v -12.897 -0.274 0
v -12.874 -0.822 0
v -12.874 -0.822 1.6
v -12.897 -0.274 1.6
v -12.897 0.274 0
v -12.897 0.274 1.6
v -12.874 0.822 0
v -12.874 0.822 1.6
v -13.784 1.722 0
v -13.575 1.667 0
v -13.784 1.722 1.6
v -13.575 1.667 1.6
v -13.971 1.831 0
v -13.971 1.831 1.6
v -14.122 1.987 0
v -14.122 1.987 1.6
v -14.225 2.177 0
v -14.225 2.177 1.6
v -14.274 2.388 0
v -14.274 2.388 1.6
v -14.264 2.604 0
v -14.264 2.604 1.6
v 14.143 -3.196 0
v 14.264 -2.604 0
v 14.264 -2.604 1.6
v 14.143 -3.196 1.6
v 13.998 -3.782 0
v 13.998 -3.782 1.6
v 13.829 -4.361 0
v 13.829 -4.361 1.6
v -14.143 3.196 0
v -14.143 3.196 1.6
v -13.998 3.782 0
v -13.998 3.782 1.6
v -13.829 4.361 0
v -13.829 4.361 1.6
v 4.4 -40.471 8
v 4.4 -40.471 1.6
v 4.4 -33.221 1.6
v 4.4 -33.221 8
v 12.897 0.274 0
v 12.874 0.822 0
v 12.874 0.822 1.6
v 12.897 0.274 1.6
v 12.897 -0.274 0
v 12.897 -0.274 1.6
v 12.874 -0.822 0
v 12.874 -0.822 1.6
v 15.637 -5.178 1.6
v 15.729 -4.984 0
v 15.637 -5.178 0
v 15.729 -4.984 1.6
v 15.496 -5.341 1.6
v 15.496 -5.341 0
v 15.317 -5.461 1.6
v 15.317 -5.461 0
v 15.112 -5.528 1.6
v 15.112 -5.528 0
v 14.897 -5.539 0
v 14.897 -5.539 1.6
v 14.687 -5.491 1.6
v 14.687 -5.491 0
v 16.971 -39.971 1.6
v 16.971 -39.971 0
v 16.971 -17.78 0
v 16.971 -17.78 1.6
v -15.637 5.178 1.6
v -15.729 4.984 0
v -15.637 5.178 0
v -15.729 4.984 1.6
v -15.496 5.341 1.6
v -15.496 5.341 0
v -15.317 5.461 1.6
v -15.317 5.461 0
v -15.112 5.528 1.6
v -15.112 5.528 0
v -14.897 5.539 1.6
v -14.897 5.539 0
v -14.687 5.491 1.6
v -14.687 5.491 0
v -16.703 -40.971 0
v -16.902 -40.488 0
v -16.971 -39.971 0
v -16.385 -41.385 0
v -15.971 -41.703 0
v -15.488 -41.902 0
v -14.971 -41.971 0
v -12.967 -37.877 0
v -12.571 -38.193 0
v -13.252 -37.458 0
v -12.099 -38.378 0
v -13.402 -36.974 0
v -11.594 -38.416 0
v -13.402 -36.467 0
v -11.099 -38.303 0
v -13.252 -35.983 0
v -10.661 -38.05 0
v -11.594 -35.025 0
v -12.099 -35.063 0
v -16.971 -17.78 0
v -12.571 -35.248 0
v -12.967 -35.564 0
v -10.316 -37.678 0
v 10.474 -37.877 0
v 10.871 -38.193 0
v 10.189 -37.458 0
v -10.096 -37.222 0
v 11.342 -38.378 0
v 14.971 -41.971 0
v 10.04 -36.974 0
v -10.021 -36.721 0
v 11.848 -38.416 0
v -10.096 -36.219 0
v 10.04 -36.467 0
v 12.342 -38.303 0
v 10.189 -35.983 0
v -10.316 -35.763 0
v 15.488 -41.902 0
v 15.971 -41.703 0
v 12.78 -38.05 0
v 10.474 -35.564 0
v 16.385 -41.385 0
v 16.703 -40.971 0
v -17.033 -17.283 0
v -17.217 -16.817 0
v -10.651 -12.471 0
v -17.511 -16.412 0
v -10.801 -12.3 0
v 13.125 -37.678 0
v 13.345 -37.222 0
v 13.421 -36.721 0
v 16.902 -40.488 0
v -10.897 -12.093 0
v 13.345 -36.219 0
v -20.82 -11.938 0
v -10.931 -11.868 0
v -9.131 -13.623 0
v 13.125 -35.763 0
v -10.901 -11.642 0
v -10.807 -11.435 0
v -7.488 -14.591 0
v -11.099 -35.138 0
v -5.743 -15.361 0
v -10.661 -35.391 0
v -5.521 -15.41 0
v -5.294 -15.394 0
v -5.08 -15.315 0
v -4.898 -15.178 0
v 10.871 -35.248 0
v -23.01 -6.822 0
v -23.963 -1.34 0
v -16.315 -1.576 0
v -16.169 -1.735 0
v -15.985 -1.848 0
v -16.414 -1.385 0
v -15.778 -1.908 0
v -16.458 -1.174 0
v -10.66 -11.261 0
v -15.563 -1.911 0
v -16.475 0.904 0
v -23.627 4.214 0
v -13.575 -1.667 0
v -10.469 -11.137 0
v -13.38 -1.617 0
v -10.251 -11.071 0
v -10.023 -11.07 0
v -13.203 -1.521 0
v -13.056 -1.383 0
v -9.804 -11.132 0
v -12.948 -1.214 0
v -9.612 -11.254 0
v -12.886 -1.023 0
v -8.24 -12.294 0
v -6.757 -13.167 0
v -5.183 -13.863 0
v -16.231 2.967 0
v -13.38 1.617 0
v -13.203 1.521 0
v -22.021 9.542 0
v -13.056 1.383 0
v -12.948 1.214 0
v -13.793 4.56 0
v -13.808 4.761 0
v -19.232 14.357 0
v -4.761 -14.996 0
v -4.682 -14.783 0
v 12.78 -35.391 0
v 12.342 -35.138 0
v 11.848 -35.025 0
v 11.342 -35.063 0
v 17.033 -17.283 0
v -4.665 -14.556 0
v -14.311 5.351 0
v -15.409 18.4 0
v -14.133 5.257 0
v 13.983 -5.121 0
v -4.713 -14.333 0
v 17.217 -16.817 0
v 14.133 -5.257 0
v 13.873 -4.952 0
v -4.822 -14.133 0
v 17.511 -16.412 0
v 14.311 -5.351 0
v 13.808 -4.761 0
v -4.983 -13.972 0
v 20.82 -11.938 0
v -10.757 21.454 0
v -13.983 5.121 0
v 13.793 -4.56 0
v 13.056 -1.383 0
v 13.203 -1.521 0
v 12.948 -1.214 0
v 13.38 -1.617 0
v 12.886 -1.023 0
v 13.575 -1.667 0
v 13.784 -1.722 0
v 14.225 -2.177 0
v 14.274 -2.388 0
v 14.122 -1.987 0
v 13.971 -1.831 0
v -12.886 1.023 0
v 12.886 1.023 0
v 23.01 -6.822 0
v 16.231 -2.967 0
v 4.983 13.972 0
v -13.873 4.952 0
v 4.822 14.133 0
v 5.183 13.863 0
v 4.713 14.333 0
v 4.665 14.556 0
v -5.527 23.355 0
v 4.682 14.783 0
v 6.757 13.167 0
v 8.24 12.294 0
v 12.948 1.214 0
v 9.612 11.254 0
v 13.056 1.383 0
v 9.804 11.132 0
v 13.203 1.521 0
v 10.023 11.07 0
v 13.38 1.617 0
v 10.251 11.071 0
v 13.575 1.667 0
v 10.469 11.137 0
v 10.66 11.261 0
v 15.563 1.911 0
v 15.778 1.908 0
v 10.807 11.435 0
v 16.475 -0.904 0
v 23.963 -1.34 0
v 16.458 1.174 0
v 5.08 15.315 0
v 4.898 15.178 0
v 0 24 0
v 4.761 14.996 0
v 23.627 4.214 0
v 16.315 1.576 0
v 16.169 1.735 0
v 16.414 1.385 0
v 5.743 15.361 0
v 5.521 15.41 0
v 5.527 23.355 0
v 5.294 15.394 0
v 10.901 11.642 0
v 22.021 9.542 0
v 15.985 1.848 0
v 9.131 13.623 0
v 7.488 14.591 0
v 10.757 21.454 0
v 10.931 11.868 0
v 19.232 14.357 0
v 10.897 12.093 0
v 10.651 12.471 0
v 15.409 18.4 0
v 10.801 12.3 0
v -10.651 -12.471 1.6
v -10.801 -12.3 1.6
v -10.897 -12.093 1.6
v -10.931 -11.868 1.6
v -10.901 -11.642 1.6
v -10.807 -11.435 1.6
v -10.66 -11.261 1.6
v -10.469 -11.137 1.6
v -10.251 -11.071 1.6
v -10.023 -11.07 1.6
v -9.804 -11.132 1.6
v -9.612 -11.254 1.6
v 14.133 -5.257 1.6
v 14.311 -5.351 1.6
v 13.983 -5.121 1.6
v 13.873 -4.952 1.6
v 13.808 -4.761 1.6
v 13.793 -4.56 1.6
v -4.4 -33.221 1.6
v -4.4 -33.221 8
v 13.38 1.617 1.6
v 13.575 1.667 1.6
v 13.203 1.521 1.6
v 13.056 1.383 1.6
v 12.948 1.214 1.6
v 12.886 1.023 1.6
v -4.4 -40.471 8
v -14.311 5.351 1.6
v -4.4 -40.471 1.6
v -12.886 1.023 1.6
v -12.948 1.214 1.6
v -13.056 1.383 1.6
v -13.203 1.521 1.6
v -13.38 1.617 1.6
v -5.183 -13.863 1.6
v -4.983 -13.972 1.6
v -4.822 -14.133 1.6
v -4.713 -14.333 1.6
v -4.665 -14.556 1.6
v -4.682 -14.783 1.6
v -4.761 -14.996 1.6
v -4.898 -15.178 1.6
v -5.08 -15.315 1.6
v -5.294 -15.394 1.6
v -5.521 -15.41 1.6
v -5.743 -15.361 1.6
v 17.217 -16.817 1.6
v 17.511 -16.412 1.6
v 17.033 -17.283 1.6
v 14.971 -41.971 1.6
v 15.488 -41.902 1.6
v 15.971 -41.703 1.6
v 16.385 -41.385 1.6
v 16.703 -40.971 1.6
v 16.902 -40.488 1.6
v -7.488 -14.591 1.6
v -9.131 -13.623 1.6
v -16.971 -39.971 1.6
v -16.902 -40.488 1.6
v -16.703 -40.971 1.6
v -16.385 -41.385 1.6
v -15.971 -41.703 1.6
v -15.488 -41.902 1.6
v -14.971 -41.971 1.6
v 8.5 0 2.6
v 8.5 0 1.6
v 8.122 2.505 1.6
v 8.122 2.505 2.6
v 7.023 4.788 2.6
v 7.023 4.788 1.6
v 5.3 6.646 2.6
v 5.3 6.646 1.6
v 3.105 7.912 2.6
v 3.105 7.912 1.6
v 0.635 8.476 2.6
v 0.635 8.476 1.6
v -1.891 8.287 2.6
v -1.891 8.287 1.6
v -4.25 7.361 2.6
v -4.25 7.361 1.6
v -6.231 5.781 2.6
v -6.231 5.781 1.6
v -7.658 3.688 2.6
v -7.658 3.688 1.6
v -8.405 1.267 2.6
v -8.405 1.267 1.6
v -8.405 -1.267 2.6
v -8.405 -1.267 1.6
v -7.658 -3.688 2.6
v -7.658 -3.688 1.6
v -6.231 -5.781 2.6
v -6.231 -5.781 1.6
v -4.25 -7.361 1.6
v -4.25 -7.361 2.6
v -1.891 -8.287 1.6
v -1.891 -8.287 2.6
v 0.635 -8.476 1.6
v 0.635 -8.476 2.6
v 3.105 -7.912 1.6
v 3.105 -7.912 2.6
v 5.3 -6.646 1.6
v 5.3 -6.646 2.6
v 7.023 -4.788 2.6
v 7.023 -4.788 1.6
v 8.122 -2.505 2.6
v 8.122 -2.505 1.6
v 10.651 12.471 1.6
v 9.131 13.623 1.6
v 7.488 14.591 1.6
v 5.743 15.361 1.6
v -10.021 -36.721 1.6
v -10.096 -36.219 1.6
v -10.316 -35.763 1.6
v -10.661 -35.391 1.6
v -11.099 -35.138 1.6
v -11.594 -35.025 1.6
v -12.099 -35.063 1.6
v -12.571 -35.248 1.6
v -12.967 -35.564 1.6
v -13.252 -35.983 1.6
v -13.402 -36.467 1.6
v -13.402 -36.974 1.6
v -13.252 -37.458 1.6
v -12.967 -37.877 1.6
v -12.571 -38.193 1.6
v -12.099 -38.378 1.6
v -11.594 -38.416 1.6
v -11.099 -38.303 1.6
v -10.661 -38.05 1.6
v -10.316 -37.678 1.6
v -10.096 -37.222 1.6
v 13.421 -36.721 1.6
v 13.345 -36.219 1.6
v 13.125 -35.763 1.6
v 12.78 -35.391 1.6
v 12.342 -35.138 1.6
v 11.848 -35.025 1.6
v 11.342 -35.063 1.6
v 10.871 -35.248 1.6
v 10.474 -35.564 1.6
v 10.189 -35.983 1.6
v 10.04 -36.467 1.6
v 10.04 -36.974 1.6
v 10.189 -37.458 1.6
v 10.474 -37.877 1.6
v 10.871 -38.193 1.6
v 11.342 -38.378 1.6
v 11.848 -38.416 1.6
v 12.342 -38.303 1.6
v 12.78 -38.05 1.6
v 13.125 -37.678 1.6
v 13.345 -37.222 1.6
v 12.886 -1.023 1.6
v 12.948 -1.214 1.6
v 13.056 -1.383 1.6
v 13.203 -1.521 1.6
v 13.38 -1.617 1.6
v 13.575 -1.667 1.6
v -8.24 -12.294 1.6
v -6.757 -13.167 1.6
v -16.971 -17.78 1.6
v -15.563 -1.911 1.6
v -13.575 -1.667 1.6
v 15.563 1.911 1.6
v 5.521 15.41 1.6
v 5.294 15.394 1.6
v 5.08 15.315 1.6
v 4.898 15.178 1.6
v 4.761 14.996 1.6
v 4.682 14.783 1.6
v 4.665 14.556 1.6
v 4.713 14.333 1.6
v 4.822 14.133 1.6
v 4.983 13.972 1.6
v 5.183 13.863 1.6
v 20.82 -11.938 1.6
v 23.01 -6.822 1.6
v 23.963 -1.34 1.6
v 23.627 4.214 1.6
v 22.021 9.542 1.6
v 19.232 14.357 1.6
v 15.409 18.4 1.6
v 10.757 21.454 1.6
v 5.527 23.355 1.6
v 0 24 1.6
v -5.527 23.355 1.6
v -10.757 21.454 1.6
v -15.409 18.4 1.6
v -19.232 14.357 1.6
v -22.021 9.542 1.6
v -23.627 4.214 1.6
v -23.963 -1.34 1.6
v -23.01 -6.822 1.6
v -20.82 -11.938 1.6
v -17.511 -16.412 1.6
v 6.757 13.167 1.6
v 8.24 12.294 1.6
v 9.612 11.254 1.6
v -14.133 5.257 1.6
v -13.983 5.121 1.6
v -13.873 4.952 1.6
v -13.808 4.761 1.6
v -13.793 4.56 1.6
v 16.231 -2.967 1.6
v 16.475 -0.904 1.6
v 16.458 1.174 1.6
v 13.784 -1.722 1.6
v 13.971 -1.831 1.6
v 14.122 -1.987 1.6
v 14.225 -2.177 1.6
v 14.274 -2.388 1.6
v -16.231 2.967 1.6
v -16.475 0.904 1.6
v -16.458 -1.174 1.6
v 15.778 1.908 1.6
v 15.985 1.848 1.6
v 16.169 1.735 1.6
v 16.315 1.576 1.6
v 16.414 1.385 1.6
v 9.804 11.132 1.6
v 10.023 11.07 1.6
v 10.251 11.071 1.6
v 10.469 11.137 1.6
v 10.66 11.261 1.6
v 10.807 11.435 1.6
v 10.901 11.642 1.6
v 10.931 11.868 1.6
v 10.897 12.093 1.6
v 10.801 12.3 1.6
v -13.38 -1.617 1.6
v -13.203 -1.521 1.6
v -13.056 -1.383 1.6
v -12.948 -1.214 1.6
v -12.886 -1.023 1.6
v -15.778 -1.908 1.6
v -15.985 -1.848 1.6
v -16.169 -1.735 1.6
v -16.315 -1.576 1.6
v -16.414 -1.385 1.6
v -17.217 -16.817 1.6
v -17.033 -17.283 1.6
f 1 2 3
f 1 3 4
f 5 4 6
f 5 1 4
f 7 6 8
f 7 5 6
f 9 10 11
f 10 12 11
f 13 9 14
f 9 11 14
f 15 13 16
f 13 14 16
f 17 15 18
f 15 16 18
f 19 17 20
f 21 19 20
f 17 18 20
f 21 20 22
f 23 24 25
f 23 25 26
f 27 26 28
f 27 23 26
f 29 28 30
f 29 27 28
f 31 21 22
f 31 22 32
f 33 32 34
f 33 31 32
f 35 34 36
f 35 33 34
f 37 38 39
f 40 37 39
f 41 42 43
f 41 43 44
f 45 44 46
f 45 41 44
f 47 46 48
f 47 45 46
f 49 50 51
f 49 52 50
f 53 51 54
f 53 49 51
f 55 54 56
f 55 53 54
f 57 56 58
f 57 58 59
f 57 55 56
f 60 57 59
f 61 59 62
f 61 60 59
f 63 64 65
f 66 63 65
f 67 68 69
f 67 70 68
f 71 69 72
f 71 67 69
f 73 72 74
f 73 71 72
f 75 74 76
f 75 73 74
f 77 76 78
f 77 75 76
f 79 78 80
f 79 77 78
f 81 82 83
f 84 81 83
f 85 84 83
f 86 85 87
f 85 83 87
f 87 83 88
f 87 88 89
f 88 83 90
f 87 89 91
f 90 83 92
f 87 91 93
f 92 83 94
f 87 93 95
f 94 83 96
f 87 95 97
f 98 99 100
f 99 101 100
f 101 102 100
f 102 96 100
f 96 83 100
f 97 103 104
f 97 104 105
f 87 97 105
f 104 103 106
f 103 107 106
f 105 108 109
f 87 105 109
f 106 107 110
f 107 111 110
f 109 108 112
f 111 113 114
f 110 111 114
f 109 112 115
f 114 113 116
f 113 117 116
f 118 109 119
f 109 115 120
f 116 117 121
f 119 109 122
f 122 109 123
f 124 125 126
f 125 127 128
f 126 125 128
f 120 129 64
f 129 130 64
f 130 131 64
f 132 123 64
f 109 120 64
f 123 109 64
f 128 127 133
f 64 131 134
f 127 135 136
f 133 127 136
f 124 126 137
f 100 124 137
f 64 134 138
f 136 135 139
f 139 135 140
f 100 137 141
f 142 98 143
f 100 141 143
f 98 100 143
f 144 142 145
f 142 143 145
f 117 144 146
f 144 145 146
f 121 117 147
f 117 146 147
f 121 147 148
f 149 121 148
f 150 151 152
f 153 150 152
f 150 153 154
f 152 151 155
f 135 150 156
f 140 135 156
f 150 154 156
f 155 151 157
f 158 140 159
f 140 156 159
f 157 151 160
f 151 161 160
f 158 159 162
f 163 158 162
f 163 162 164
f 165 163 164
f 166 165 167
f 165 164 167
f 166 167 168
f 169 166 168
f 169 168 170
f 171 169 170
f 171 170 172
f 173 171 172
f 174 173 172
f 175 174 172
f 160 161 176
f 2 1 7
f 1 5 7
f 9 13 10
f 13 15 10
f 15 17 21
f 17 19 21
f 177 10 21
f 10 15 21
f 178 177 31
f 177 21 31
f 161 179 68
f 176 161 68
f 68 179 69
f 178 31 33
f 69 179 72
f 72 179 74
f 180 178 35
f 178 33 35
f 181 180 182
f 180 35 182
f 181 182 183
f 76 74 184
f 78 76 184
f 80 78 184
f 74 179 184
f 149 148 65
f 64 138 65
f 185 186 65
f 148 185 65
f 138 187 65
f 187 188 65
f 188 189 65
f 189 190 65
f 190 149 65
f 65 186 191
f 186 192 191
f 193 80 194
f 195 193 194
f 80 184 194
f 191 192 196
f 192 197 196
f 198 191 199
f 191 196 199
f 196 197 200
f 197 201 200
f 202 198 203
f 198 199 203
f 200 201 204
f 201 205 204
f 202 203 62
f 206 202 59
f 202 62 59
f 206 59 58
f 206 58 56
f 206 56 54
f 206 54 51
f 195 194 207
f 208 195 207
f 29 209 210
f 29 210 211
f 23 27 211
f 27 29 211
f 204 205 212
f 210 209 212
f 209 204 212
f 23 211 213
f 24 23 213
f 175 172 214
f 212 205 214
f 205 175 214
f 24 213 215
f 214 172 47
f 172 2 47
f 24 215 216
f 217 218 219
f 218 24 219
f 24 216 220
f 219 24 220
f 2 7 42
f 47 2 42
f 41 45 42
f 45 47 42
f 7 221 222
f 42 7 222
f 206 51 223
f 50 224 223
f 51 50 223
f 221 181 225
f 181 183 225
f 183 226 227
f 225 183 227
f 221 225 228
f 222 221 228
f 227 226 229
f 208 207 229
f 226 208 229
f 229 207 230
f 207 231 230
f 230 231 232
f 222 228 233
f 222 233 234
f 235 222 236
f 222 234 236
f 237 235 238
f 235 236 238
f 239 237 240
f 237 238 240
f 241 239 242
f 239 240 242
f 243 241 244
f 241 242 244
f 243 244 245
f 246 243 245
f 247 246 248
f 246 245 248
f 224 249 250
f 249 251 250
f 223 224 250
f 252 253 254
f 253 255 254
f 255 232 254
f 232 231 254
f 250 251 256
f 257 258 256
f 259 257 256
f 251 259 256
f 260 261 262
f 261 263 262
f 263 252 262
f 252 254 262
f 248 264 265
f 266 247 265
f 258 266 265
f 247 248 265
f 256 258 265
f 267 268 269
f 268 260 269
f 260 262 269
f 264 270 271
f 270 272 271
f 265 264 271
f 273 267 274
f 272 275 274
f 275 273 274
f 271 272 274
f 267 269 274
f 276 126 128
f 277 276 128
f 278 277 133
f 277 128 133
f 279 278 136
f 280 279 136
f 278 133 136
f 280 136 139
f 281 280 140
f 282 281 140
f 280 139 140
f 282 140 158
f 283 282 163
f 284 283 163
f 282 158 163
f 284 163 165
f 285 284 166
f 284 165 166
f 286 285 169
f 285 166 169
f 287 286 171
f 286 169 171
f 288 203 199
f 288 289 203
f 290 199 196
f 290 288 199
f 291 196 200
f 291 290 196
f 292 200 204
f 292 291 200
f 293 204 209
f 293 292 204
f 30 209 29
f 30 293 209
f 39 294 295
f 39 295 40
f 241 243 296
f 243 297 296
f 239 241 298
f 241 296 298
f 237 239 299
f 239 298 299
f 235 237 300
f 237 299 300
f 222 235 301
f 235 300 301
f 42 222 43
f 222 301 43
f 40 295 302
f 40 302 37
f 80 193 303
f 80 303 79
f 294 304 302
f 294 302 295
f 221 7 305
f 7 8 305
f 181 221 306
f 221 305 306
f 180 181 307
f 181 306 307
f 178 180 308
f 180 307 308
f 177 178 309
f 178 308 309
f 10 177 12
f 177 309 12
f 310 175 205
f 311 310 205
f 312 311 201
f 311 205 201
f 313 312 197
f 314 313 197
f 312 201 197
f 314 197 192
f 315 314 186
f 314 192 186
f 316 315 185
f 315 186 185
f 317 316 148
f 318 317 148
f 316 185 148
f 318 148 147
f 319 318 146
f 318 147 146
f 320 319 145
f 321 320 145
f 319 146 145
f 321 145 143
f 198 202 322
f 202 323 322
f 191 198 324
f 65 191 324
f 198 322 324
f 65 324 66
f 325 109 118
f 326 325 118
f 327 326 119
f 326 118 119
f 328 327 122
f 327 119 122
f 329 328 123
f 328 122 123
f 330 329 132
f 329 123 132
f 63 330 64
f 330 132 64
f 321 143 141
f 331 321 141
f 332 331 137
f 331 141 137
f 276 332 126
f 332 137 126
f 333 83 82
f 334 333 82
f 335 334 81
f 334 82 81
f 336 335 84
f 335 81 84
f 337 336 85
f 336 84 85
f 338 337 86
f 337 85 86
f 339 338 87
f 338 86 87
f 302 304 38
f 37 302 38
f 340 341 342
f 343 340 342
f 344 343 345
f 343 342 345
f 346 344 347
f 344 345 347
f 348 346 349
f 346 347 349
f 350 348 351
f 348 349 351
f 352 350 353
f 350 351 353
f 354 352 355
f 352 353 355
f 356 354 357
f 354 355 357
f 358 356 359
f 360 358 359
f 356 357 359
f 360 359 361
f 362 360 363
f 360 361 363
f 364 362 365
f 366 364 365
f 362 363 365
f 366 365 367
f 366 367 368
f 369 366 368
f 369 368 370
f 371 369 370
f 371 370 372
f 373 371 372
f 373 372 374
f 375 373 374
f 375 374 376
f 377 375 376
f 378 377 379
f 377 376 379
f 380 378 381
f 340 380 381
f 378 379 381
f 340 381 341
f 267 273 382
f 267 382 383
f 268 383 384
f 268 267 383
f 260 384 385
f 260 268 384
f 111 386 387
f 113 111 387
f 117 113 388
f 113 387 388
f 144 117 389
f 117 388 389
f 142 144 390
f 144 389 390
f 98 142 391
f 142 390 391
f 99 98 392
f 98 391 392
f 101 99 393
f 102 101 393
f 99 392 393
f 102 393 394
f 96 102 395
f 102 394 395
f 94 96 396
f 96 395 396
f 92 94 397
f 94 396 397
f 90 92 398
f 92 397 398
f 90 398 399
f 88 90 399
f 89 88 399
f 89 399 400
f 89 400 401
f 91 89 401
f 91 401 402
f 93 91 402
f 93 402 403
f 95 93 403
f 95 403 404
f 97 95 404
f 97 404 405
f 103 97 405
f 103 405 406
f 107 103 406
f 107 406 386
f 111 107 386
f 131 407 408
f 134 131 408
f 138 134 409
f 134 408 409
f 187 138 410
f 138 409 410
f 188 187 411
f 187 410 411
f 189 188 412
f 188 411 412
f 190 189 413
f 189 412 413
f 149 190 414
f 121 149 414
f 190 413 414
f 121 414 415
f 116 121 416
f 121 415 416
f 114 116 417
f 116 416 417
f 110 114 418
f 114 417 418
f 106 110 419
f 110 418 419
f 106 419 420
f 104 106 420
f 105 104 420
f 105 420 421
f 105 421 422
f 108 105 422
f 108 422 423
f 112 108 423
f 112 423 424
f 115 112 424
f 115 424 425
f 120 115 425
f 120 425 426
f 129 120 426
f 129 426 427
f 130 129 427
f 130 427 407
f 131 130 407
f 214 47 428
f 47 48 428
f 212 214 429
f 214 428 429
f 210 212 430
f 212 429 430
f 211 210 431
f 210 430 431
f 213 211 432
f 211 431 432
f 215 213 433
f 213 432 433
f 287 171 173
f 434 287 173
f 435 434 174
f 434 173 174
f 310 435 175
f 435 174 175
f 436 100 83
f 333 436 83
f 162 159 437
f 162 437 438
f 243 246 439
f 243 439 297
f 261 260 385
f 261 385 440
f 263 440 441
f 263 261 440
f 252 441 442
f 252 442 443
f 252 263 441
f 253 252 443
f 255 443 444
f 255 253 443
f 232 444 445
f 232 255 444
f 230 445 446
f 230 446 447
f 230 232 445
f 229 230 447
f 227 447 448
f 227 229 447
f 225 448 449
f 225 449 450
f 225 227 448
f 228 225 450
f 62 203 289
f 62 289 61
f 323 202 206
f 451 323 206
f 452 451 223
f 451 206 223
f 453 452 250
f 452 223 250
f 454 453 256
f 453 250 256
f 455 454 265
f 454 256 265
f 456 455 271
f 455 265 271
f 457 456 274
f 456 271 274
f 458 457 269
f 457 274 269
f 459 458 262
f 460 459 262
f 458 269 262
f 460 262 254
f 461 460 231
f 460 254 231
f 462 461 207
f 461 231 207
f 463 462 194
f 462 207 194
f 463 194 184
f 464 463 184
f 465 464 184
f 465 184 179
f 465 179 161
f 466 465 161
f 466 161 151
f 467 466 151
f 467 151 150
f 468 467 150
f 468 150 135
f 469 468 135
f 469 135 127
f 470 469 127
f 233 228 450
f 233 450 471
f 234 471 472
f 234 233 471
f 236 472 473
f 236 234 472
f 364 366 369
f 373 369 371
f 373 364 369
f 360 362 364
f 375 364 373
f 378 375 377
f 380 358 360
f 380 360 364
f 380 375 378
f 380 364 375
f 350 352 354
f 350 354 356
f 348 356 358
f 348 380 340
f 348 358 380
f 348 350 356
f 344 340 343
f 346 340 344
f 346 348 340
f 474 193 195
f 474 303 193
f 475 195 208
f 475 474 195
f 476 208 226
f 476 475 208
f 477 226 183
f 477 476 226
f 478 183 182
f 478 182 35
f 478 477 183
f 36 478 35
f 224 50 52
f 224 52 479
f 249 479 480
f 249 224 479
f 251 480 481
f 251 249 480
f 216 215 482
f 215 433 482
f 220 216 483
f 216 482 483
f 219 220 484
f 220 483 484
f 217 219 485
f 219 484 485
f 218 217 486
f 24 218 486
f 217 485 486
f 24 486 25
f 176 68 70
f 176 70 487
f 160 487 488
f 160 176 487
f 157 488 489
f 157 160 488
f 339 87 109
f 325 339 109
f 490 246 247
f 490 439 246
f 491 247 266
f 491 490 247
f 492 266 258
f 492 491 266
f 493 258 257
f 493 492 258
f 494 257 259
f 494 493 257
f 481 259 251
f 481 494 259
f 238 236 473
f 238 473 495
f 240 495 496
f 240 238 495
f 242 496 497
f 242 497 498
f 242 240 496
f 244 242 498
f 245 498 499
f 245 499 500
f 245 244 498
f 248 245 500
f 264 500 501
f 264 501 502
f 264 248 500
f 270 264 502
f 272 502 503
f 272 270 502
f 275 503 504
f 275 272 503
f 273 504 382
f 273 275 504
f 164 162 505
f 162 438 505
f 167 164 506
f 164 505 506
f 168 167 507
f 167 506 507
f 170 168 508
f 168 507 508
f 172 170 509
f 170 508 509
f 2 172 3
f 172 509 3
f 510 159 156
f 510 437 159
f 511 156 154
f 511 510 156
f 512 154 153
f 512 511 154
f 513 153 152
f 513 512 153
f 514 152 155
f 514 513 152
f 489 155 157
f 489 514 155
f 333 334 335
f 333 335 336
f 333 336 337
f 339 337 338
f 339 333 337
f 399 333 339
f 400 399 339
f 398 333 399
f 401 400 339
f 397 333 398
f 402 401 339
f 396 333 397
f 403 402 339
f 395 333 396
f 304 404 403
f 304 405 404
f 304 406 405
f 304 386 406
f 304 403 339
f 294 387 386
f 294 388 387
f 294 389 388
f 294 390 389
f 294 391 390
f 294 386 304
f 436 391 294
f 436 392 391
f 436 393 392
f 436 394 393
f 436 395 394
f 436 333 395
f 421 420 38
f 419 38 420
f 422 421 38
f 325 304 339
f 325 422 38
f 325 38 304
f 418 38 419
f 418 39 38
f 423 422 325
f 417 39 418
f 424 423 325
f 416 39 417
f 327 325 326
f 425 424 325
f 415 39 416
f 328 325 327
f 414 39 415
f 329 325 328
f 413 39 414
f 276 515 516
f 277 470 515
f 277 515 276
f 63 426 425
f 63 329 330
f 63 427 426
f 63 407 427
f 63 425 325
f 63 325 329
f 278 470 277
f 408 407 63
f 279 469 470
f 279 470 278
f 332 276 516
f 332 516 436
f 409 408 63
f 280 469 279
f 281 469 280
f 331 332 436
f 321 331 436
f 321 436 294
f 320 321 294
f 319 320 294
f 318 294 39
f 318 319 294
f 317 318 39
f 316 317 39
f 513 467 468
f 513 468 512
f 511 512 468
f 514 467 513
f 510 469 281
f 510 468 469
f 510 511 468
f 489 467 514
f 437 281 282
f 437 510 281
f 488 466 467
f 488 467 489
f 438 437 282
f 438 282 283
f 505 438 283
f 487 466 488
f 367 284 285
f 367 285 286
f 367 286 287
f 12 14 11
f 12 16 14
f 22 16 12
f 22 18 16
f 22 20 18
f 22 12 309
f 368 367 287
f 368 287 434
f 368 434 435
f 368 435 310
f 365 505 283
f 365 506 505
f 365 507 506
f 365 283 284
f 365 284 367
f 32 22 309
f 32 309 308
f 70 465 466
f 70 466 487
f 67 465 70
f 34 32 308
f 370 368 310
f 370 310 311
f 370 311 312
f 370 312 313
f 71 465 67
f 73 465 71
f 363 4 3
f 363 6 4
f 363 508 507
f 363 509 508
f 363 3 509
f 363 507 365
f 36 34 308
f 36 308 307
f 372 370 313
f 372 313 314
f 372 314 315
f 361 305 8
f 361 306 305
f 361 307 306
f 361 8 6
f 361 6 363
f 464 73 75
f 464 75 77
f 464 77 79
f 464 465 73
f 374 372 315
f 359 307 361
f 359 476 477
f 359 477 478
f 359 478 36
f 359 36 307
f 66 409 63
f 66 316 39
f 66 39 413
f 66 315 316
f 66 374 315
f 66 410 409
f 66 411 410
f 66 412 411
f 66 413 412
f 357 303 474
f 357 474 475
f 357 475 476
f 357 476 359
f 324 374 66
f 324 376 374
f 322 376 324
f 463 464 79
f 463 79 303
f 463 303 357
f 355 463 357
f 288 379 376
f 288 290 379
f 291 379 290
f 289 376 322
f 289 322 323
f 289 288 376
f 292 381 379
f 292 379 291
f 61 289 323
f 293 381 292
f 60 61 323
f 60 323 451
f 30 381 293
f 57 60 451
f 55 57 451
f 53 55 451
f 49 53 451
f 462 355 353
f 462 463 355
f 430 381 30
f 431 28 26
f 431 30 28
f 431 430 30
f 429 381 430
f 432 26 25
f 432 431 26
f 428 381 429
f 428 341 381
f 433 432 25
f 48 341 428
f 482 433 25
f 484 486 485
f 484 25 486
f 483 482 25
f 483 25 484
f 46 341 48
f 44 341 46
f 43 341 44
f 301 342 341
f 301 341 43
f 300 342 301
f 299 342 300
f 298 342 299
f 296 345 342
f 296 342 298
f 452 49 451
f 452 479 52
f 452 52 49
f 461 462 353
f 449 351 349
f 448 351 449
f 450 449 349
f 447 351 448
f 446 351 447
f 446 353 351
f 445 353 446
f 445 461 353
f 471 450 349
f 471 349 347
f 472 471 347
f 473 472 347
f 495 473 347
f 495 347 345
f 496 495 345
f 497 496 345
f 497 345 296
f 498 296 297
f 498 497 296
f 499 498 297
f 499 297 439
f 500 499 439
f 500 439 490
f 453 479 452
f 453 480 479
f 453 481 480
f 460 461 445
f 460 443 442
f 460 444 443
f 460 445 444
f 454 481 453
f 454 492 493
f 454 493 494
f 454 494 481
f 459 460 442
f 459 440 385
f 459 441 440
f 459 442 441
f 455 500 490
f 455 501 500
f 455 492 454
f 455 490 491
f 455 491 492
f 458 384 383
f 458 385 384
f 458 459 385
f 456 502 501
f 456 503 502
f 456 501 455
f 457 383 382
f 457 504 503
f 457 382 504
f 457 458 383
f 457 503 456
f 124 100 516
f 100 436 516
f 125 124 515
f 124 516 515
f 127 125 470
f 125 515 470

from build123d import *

# Parameters (mm, degrees)
OUTLINE_DEPTH        = 1.6
FILLETS_R            = 0.8
FILLET2_R            = 2
SKETCH3_R            = 8.5
LED_RING_AREA_DEPTH  = 1
SKETCH4_R            = 1.7
MOUNTING_HOLES_DEPTH = 49.37445749
SKETCH5_W            = 8.8
SKETCH5_H            = 7.25
CONNECTOR_AREA_DEPTH = 6.4


with BuildPart() as part:
    # Sketch1 → Outline (new body)
    with BuildSketch(Plane.XY):
        with BuildLine():
            Line((-16.970562748, -16.970562748), (-16.970562748, -39.970562748))
            ThreePointArc((-16.970562748, -39.970562748), (-16.384776311, -41.384776311), (-14.970562748, -41.970562748))
            Line((-14.970562748, -41.970562748), (14.970562748, -41.970562748))
            ThreePointArc((14.970562748, -41.970562748), (16.384776311, -41.384776311), (16.970562748, -39.970562748))
            Line((16.970562748, -39.970562748), (16.970562748, -16.970562748))
            ThreePointArc((16.970562748, -16.970562748), (0, 24), (-16.970562748, -16.970562748))
        make_face()
        with BuildLine():
            Line((16.377011502, 2.010844166), (12.803845356, 1.57211453))
            ThreePointArc((12.803845356, 1.57211453), (12.9, 0), (12.803845356, -1.57211453))
            Line((12.803845356, -1.57211453), (14.391919199, -1.767105479))
            ThreePointArc((14.391919199, -1.767105479), (14.084460012, -3.446445439), (13.581746744, -5.078007028))
            Line((13.581746744, -5.078007028), (15.455091123, -5.778421791))
            ThreePointArc((15.455091123, -5.778421791), (16.38562954, -1.939367058), (16.377011502, 2.010844166))
        make_face(mode=Mode.SUBTRACT)
        with BuildLine():
            Line((-16.377011502, -2.010844166), (-12.803845356, -1.57211453))
            ThreePointArc((-12.803845356, -1.57211453), (-12.9, 0), (-12.803845356, 1.57211453))
            Line((-12.803845356, 1.57211453), (-14.391919199, 1.767105479))
            ThreePointArc((-14.391919199, 1.767105479), (-14.084460012, 3.446445439), (-13.581746744, 5.078007028))
            Line((-13.581746744, 5.078007028), (-15.455091123, 5.778421791))
            ThreePointArc((-15.455091123, 5.778421791), (-16.38562954, 1.939367058), (-16.377011502, -2.010844166))
        make_face(mode=Mode.SUBTRACT)
        with BuildLine():
            ThreePointArc((-9.611831115, -11.254008291), (-7.511567772, -12.752111575), (-5.183069243, -13.862748401))
            ThreePointArc((-5.183069243, -13.862748401), (-4.713897396, -14.892252057), (-5.743401053, -15.361423904))
            ThreePointArc((-5.743401053, -15.361423904), (-8.323629153, -14.130718231), (-10.650947993, -12.470657836))
            ThreePointArc((-10.650947993, -12.470657836), (-10.739714326, -11.342774625), (-9.611831115, -11.254008291))
        make_face(mode=Mode.SUBTRACT)
        with BuildLine():
            ThreePointArc((5.743401053, 15.361423904), (4.713897396, 14.892252057), (5.183069243, 13.862748401))
            ThreePointArc((5.183069243, 13.862748401), (7.511567772, 12.752111575), (9.611831115, 11.254008291))
            ThreePointArc((9.611831115, 11.254008291), (10.739714326, 11.342774625), (10.650947993, 12.470657836))
            ThreePointArc((10.650947993, 12.470657836), (8.323629153, 14.130718231), (5.743401053, 15.361423904))
        make_face(mode=Mode.SUBTRACT)
    extrude(amount=OUTLINE_DEPTH)

    # Fillets
    fillets_edges = [part.edges().sort_by_distance(p)[0] for p in [
        (16.377011502, 2.010844166, 0.8),
        (12.803845356, 1.57211453, 0.8),
        (13.581746744, -5.078007028, 0.8),
        (15.455091123, -5.778421791, 0.8),
        (14.391919199, -1.767105479, 0.8),
        (12.803845356, -1.57211453, 0.8),
        (-12.803845356, -1.57211453, 0.8),
        (-16.377011502, -2.010844166, 0.8),
        (-15.455091123, 5.778421791, 0.8),
        (-13.581746744, 5.078007028, 0.8),
        (-12.803845356, 1.57211453, 0.8),
        (-14.391919199, 1.767105479, 0.8),
    ]]
    fillet(fillets_edges, radius=FILLETS_R - 0.0001)  # a hair under: the kernel refuses the full size

    # Fillet2
    fillet2_edges = [part.edges().sort_by_distance(p)[0] for p in [
        (16.970562748, -16.970562748, 0.8),
        (-16.970562748, -16.970562748, 0.8),
    ]]
    fillet(fillet2_edges, radius=FILLET2_R)

    # Sketch3 → LED Ring Area (add)
    with BuildSketch(Plane.XY.offset(1.6)):
        Circle(SKETCH3_R)
    extrude(amount=LED_RING_AREA_DEPTH)

    # Sketch4 → Mounting Holes (cut, through all)
    with BuildSketch(Plane.XY.offset(1.6)):
        with Locations((-11.720562748, -36.720562748)):
            Circle(SKETCH4_R)
        with Locations((11.720562748, -36.720562748)):
            Circle(SKETCH4_R)
    extrude(amount=-MOUNTING_HOLES_DEPTH, mode=Mode.SUBTRACT)

    # Sketch5 → Connector Area (add)
    with BuildSketch(Plane.XY.offset(1.6)):
        with Locations((0, -36.845562748)):
            Rectangle(SKETCH5_W, SKETCH5_H)
    extrude(amount=CONNECTOR_AREA_DEPTH)


solid = part.part
